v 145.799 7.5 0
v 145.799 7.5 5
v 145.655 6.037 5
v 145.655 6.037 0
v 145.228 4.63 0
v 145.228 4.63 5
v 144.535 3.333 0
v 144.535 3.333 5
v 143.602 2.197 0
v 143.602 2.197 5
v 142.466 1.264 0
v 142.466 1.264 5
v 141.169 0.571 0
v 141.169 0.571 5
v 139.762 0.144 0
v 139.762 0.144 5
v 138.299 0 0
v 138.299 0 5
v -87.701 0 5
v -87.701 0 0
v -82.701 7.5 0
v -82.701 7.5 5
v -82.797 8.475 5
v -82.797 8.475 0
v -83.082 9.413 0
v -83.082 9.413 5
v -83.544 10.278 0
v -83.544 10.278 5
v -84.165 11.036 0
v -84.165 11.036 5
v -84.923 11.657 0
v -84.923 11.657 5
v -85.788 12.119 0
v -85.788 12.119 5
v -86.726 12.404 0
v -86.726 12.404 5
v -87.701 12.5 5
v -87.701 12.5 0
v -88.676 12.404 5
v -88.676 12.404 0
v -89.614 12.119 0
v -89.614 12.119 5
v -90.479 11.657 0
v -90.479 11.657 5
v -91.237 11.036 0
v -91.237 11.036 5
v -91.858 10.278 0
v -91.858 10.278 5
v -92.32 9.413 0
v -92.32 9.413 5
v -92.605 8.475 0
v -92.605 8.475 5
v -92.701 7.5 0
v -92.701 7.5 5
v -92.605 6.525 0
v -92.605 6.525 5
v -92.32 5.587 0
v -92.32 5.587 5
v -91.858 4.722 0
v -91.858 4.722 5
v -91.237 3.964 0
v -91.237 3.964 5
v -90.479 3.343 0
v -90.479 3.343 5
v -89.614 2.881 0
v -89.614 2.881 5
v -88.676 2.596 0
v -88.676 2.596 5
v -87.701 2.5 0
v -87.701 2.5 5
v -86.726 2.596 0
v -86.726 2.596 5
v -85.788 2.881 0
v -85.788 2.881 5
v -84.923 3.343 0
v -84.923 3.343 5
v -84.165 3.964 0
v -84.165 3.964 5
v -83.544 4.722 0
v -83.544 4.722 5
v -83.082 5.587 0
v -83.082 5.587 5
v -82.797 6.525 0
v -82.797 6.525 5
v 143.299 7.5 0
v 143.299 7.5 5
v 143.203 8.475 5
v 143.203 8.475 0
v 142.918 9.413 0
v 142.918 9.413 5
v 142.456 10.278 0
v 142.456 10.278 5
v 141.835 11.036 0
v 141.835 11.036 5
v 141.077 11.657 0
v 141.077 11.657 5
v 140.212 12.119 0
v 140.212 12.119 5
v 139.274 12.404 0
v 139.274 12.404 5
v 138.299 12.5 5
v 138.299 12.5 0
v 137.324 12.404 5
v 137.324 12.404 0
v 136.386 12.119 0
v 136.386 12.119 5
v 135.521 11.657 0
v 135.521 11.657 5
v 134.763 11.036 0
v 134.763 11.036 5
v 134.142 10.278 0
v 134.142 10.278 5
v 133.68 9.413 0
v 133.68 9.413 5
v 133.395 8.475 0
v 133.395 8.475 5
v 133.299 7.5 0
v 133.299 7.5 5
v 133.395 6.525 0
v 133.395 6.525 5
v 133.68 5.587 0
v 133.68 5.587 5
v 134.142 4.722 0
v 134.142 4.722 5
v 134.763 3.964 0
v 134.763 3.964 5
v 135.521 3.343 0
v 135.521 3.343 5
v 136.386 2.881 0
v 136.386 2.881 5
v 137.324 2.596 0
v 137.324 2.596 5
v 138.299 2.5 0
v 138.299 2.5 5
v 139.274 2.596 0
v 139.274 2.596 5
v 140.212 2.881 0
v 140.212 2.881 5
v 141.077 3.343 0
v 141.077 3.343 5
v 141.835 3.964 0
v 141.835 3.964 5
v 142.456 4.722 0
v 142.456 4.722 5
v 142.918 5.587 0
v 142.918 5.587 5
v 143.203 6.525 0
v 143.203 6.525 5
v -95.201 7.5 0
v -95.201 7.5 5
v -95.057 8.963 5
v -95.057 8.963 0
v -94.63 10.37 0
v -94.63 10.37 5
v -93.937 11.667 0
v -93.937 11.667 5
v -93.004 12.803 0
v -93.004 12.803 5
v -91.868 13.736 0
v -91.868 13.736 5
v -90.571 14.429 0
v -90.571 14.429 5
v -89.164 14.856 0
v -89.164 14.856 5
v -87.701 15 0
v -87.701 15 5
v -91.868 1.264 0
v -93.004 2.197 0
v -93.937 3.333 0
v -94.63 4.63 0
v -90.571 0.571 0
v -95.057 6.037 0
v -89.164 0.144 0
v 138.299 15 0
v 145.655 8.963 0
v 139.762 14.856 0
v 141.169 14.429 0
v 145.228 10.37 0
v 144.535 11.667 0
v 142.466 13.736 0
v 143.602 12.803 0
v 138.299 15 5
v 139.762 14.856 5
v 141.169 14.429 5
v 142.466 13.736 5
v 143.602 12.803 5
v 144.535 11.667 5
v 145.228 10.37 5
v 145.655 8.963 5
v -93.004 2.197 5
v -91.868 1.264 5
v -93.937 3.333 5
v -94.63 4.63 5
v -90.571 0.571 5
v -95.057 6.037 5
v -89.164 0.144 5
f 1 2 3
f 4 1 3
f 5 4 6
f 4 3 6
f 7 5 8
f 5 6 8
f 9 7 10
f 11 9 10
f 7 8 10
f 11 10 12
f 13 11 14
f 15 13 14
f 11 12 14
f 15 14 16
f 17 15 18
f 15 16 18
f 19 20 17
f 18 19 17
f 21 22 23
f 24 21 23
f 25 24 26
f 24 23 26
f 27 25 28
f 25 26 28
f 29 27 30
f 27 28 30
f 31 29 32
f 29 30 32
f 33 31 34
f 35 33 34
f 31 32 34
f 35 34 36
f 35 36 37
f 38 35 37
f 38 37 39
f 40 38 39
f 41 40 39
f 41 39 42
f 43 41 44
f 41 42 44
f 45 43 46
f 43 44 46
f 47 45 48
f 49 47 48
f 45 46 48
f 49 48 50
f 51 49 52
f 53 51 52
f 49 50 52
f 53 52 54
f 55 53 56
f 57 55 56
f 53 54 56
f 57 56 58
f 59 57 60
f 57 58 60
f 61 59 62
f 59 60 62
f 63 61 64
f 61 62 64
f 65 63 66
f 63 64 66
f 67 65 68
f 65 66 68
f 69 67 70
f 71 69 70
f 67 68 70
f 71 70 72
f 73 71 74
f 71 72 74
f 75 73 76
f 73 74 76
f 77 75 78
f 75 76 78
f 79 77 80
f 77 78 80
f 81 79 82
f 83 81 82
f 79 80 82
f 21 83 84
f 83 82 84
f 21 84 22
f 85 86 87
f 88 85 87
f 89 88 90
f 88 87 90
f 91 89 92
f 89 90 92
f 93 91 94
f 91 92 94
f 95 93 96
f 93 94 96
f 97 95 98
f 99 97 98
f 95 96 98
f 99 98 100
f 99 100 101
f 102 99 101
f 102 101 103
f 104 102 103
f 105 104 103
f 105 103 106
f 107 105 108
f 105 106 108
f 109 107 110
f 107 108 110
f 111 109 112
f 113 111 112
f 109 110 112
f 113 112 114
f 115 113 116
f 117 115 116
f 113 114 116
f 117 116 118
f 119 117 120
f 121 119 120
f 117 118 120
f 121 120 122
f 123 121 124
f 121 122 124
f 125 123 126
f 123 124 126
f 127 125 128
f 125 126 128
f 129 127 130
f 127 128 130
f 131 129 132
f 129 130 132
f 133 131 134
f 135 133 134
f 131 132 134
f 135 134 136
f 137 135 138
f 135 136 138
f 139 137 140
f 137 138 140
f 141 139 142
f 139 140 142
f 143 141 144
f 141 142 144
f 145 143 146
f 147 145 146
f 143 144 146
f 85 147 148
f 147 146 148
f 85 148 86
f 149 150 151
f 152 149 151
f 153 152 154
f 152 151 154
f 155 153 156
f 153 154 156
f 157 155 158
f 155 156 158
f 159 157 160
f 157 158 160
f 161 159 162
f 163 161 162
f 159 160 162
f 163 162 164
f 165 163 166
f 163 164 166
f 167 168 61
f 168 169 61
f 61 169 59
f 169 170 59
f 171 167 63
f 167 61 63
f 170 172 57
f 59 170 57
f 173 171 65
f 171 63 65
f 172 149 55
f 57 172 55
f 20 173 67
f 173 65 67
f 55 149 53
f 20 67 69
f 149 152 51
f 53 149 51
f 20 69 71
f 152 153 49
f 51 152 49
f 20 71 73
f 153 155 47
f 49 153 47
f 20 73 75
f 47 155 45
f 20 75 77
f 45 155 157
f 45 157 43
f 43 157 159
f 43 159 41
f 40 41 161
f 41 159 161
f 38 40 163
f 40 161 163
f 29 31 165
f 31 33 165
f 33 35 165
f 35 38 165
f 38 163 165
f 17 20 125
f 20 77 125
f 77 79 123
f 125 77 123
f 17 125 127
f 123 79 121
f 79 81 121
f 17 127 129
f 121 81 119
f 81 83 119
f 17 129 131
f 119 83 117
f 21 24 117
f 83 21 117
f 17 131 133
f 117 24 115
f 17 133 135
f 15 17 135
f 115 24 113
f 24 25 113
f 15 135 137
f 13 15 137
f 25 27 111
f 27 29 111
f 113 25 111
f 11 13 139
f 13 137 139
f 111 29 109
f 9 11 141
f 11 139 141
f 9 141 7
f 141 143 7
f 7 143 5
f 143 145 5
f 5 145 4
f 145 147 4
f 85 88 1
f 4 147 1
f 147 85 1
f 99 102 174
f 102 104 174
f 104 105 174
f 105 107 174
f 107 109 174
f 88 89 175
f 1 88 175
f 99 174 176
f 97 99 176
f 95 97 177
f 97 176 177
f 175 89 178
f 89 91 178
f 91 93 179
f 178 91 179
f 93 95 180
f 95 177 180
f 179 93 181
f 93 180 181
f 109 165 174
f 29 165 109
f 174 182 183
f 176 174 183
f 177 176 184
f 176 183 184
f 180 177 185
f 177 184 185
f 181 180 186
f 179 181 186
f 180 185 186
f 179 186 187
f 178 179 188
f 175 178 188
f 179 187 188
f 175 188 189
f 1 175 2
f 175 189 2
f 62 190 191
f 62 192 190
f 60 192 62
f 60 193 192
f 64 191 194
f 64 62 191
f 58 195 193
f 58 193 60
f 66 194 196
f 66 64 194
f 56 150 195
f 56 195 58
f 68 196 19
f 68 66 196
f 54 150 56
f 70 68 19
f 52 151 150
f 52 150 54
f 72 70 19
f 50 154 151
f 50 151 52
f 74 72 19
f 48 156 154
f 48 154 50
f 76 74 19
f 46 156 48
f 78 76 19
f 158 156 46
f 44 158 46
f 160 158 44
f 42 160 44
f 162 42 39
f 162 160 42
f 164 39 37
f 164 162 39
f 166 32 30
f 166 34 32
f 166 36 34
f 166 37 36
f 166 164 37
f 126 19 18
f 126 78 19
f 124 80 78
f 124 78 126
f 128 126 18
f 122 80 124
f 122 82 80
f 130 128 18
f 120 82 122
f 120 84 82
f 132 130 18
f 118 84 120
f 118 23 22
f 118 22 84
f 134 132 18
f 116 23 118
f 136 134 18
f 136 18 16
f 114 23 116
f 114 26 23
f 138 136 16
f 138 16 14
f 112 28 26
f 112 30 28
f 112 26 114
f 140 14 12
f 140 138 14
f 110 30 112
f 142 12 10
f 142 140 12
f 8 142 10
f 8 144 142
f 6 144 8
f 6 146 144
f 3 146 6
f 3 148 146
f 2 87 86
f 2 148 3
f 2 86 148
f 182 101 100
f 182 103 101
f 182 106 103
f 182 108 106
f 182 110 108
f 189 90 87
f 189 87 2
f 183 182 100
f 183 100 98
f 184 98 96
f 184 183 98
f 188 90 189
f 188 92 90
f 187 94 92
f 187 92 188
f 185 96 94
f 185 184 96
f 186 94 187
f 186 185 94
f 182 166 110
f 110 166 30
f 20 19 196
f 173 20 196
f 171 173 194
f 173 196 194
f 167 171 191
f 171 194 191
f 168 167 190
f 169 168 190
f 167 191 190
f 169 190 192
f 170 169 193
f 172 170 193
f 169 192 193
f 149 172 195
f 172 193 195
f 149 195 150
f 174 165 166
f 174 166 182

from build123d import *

# Parameters (mm, degrees)
SKETCH1_W           = 241
SKETCH1_H           = 15
BOSS_EXTRUDE1_DEPTH = 5
SKETCH2_R           = 5
CUT_EXTRUDE2_DEPTH  = 5


with BuildPart() as part:
    # Sketch1 → Boss-Extrude1 (new body)
    with BuildSketch(Plane.XY):
        with Locations((25.298972138, 7.5)):
            Rectangle(SKETCH1_W, SKETCH1_H)
    extrude(amount=BOSS_EXTRUDE1_DEPTH)

    # Sketch2 → Cut-Extrude2 (cut)
    with BuildSketch(Plane.XY.offset(5)):
        with Locations((-87.701027862, 7.5)):
            Circle(SKETCH2_R)
        with BuildLine():
            Line((-87.701027825, 15), (-95.201027862, 15))
            Line((-95.201027862, 15), (-95.201027862, 7.5))
            ThreePointArc((-95.201027862, 7.5), (-93.004328708, 12.803300872), (-87.701027825, 15))
        make_face()
        with BuildLine():
            ThreePointArc((-87.701027862, 0), (-93.004328721, 2.196699141), (-95.201027862, 7.5))
            Line((-95.201027862, 7.5), (-95.201027862, 0))
            Line((-95.201027862, 0), (-87.701027862, 0))
        make_face()
        with Locations((138.298972138, 7.5)):
            Circle(SKETCH2_R)
        with BuildLine():
            Line((145.798972138, 15), (138.298972138, 15))
            ThreePointArc((138.298972138, 15), (143.602272997, 12.803300859), (145.798972138, 7.5))
            Line((145.798972138, 7.5), (145.798972138, 15))
        make_face()
        with BuildLine():
            ThreePointArc((145.798972138, 7.5), (143.602272997, 2.196699141), (138.298972138, 0))
            Line((138.298972138, 0), (145.798972138, 0))
            Line((145.798972138, 0), (145.798972138, 7.5))
        make_face()
    extrude(amount=-CUT_EXTRUDE2_DEPTH, mode=Mode.SUBTRACT)


solid = part.part
